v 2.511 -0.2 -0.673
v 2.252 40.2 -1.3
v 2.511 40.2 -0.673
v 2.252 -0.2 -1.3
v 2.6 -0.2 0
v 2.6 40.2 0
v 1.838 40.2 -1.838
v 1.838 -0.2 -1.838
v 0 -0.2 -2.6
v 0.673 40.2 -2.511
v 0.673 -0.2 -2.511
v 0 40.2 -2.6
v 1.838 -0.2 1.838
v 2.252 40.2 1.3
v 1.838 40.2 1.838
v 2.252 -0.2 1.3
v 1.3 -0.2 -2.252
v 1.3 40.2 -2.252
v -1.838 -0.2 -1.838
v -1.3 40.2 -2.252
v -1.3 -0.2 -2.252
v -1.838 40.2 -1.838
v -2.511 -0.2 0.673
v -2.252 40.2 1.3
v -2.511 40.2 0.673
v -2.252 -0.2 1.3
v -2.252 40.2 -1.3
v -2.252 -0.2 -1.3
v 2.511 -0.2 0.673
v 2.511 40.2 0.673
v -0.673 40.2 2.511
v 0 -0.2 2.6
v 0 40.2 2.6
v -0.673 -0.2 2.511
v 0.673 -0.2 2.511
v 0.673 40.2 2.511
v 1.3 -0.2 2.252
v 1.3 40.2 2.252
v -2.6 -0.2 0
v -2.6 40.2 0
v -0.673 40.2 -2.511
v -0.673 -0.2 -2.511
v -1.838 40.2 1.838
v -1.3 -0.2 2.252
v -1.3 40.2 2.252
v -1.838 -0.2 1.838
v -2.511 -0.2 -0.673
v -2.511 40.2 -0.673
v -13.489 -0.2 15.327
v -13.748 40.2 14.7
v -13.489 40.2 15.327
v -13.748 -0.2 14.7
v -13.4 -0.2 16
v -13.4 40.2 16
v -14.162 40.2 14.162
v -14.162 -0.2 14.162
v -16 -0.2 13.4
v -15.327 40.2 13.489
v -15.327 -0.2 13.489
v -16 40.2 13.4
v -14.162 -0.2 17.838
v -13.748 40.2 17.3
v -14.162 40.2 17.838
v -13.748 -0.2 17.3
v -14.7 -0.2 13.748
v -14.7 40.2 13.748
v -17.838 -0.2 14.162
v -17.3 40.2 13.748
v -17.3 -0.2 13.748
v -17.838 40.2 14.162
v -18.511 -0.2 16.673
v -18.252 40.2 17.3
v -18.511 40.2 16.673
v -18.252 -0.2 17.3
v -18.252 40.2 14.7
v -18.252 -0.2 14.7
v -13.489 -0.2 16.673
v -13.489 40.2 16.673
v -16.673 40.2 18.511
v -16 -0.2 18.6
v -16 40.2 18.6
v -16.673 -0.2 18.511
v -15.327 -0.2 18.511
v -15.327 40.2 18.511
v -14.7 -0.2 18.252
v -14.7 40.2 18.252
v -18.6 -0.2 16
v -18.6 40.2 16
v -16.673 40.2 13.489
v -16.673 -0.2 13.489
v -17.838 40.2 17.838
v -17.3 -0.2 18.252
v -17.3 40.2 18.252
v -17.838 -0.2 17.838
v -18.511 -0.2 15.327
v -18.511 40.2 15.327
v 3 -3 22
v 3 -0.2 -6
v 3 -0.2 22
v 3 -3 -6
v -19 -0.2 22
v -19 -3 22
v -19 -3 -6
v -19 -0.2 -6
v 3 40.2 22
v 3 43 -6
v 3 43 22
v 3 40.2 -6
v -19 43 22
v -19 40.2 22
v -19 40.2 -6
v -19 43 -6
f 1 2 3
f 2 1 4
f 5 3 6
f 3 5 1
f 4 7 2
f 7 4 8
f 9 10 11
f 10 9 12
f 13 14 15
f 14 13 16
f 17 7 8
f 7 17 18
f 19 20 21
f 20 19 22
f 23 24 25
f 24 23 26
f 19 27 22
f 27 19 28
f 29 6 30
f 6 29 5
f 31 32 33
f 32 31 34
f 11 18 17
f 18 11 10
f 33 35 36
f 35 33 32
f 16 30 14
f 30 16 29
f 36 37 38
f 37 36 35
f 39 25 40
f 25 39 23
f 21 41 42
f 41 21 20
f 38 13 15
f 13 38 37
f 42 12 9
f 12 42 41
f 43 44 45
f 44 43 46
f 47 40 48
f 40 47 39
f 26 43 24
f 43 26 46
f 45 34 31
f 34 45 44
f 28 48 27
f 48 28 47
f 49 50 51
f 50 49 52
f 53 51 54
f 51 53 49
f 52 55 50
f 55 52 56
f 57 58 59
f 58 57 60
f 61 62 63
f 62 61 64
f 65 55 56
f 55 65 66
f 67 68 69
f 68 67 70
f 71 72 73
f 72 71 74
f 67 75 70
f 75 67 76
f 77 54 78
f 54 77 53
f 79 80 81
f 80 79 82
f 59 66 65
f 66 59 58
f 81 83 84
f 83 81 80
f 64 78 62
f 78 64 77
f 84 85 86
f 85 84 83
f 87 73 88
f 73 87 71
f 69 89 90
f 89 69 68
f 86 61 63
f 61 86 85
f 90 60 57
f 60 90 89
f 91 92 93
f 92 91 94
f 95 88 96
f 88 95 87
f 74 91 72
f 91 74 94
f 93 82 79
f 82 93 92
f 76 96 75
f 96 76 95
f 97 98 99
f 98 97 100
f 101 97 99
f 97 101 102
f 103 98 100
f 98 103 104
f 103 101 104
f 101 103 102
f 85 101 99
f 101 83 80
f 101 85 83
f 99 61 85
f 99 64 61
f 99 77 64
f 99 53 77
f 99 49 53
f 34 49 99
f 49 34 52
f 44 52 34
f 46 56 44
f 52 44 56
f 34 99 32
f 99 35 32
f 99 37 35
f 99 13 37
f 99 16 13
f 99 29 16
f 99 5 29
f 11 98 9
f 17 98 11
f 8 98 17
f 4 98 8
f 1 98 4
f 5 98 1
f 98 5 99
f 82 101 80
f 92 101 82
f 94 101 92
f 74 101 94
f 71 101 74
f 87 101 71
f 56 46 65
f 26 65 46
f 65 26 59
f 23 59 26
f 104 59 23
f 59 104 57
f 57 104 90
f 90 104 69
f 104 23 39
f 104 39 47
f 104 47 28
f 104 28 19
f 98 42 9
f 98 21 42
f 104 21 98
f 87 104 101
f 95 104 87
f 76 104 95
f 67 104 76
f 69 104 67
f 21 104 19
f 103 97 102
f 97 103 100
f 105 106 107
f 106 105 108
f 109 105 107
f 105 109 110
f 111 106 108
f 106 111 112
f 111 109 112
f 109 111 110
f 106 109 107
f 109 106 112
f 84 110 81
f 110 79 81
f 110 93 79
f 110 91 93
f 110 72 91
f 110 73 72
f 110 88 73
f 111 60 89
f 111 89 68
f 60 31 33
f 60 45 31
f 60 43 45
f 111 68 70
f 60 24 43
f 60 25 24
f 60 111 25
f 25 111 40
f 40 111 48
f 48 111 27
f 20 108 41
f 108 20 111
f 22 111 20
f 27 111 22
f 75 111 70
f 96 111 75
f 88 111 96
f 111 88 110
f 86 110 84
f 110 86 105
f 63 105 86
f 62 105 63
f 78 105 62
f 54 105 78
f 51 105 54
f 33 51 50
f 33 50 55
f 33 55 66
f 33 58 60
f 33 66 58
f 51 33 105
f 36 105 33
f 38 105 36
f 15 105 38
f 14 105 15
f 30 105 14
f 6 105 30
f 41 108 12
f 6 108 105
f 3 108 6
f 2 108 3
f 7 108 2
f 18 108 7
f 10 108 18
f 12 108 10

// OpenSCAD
/* Parametric Sarrus Linkage by Tomi T. Salo <ttsalo@iki.fi> */

/* 
  Design ideas:
  - Parametric (of course)
  - Parallelogram structure
  - Hinge
   - Let's at least try snap-on hinges in the same style that the rigid chain connectors use.

  TODO: With lh=0.3 and nozzle=0.5, fit is currently way too tight. Feels pretty sturdy though.

  Maybe TODO: Would increasing the hinge bar and holder diameter make the assembly more
  rigid?
*/

// Parameters
t = 3; // Main material thickness, applied to many components
tol = 0.2; // Main tolerance to provide tight fit
h = 16; // Main constraint spacing
l = 50; // Element length
w = 40; // Element width
snap_opening = 120;
snap_tol = 0.4;
hinge_end_tol = 0.2;

/* Partially open ring that snaps around a cylindrical shaft. */
module snap_in(inner_r, outer_r, opening, h) {
  rotate([90, 0, 180]) rotate([0, 0, -opening/2]) {
    difference() {
      cylinder(r=outer_r, h=h, $fn=32);
      cylinder(r=inner_r, h=h, $fn=32);
      cube([outer_r, outer_r, h]);
      rotate([0, 0, opening-90]) cube([outer_r, outer_r, h]);
    }
    _r = (outer_r-inner_r)/2;
    translate([inner_r+_r, 0, 0])
      cylinder(r=_r, h=h, $fn=16);
    rotate([0, 0, opening])
      translate([inner_r+_r, 0, 0])
        cylinder(r=_r, h=h, $fn=16);
  }   
}

/* Hinge element with two bars */
module hinge() {
    translate([0, -t/2, 0])
      rotate([-90, 0, 0])
        cylinder(r=t-snap_tol, h=w+t, $fn=24);
    translate([-h, -t/2, h])
      rotate([-90, 0, 0])
        cylinder(r=t-snap_tol, h=w+t, $fn=24);
    translate([-h-t, -t, -t*2])
      cube([h+t*2, t-hinge_end_tol, h+t*4]);
    translate([-h-t, w+hinge_end_tol, -t*2])
      cube([h+t*2, t-hinge_end_tol, h+t*4]);
}

/* Connecting element */
module element() {
    cube([l, w, t]);
    translate([0, 0, t*2])
      rotate([0, 90, 0])
        snap_in(t, t*2, snap_opening, w);
    translate([l, 0, t*2])
      rotate([0, 90, 0])
        snap_in(t, t*2, snap_opening, w);
}

module assembly() {
    translate([0, 0, -t*2])
      element();
    translate([-h, 0, -t*2+h])
      element();
    hinge();
     
}

//assembly();
//element();
hinge();
